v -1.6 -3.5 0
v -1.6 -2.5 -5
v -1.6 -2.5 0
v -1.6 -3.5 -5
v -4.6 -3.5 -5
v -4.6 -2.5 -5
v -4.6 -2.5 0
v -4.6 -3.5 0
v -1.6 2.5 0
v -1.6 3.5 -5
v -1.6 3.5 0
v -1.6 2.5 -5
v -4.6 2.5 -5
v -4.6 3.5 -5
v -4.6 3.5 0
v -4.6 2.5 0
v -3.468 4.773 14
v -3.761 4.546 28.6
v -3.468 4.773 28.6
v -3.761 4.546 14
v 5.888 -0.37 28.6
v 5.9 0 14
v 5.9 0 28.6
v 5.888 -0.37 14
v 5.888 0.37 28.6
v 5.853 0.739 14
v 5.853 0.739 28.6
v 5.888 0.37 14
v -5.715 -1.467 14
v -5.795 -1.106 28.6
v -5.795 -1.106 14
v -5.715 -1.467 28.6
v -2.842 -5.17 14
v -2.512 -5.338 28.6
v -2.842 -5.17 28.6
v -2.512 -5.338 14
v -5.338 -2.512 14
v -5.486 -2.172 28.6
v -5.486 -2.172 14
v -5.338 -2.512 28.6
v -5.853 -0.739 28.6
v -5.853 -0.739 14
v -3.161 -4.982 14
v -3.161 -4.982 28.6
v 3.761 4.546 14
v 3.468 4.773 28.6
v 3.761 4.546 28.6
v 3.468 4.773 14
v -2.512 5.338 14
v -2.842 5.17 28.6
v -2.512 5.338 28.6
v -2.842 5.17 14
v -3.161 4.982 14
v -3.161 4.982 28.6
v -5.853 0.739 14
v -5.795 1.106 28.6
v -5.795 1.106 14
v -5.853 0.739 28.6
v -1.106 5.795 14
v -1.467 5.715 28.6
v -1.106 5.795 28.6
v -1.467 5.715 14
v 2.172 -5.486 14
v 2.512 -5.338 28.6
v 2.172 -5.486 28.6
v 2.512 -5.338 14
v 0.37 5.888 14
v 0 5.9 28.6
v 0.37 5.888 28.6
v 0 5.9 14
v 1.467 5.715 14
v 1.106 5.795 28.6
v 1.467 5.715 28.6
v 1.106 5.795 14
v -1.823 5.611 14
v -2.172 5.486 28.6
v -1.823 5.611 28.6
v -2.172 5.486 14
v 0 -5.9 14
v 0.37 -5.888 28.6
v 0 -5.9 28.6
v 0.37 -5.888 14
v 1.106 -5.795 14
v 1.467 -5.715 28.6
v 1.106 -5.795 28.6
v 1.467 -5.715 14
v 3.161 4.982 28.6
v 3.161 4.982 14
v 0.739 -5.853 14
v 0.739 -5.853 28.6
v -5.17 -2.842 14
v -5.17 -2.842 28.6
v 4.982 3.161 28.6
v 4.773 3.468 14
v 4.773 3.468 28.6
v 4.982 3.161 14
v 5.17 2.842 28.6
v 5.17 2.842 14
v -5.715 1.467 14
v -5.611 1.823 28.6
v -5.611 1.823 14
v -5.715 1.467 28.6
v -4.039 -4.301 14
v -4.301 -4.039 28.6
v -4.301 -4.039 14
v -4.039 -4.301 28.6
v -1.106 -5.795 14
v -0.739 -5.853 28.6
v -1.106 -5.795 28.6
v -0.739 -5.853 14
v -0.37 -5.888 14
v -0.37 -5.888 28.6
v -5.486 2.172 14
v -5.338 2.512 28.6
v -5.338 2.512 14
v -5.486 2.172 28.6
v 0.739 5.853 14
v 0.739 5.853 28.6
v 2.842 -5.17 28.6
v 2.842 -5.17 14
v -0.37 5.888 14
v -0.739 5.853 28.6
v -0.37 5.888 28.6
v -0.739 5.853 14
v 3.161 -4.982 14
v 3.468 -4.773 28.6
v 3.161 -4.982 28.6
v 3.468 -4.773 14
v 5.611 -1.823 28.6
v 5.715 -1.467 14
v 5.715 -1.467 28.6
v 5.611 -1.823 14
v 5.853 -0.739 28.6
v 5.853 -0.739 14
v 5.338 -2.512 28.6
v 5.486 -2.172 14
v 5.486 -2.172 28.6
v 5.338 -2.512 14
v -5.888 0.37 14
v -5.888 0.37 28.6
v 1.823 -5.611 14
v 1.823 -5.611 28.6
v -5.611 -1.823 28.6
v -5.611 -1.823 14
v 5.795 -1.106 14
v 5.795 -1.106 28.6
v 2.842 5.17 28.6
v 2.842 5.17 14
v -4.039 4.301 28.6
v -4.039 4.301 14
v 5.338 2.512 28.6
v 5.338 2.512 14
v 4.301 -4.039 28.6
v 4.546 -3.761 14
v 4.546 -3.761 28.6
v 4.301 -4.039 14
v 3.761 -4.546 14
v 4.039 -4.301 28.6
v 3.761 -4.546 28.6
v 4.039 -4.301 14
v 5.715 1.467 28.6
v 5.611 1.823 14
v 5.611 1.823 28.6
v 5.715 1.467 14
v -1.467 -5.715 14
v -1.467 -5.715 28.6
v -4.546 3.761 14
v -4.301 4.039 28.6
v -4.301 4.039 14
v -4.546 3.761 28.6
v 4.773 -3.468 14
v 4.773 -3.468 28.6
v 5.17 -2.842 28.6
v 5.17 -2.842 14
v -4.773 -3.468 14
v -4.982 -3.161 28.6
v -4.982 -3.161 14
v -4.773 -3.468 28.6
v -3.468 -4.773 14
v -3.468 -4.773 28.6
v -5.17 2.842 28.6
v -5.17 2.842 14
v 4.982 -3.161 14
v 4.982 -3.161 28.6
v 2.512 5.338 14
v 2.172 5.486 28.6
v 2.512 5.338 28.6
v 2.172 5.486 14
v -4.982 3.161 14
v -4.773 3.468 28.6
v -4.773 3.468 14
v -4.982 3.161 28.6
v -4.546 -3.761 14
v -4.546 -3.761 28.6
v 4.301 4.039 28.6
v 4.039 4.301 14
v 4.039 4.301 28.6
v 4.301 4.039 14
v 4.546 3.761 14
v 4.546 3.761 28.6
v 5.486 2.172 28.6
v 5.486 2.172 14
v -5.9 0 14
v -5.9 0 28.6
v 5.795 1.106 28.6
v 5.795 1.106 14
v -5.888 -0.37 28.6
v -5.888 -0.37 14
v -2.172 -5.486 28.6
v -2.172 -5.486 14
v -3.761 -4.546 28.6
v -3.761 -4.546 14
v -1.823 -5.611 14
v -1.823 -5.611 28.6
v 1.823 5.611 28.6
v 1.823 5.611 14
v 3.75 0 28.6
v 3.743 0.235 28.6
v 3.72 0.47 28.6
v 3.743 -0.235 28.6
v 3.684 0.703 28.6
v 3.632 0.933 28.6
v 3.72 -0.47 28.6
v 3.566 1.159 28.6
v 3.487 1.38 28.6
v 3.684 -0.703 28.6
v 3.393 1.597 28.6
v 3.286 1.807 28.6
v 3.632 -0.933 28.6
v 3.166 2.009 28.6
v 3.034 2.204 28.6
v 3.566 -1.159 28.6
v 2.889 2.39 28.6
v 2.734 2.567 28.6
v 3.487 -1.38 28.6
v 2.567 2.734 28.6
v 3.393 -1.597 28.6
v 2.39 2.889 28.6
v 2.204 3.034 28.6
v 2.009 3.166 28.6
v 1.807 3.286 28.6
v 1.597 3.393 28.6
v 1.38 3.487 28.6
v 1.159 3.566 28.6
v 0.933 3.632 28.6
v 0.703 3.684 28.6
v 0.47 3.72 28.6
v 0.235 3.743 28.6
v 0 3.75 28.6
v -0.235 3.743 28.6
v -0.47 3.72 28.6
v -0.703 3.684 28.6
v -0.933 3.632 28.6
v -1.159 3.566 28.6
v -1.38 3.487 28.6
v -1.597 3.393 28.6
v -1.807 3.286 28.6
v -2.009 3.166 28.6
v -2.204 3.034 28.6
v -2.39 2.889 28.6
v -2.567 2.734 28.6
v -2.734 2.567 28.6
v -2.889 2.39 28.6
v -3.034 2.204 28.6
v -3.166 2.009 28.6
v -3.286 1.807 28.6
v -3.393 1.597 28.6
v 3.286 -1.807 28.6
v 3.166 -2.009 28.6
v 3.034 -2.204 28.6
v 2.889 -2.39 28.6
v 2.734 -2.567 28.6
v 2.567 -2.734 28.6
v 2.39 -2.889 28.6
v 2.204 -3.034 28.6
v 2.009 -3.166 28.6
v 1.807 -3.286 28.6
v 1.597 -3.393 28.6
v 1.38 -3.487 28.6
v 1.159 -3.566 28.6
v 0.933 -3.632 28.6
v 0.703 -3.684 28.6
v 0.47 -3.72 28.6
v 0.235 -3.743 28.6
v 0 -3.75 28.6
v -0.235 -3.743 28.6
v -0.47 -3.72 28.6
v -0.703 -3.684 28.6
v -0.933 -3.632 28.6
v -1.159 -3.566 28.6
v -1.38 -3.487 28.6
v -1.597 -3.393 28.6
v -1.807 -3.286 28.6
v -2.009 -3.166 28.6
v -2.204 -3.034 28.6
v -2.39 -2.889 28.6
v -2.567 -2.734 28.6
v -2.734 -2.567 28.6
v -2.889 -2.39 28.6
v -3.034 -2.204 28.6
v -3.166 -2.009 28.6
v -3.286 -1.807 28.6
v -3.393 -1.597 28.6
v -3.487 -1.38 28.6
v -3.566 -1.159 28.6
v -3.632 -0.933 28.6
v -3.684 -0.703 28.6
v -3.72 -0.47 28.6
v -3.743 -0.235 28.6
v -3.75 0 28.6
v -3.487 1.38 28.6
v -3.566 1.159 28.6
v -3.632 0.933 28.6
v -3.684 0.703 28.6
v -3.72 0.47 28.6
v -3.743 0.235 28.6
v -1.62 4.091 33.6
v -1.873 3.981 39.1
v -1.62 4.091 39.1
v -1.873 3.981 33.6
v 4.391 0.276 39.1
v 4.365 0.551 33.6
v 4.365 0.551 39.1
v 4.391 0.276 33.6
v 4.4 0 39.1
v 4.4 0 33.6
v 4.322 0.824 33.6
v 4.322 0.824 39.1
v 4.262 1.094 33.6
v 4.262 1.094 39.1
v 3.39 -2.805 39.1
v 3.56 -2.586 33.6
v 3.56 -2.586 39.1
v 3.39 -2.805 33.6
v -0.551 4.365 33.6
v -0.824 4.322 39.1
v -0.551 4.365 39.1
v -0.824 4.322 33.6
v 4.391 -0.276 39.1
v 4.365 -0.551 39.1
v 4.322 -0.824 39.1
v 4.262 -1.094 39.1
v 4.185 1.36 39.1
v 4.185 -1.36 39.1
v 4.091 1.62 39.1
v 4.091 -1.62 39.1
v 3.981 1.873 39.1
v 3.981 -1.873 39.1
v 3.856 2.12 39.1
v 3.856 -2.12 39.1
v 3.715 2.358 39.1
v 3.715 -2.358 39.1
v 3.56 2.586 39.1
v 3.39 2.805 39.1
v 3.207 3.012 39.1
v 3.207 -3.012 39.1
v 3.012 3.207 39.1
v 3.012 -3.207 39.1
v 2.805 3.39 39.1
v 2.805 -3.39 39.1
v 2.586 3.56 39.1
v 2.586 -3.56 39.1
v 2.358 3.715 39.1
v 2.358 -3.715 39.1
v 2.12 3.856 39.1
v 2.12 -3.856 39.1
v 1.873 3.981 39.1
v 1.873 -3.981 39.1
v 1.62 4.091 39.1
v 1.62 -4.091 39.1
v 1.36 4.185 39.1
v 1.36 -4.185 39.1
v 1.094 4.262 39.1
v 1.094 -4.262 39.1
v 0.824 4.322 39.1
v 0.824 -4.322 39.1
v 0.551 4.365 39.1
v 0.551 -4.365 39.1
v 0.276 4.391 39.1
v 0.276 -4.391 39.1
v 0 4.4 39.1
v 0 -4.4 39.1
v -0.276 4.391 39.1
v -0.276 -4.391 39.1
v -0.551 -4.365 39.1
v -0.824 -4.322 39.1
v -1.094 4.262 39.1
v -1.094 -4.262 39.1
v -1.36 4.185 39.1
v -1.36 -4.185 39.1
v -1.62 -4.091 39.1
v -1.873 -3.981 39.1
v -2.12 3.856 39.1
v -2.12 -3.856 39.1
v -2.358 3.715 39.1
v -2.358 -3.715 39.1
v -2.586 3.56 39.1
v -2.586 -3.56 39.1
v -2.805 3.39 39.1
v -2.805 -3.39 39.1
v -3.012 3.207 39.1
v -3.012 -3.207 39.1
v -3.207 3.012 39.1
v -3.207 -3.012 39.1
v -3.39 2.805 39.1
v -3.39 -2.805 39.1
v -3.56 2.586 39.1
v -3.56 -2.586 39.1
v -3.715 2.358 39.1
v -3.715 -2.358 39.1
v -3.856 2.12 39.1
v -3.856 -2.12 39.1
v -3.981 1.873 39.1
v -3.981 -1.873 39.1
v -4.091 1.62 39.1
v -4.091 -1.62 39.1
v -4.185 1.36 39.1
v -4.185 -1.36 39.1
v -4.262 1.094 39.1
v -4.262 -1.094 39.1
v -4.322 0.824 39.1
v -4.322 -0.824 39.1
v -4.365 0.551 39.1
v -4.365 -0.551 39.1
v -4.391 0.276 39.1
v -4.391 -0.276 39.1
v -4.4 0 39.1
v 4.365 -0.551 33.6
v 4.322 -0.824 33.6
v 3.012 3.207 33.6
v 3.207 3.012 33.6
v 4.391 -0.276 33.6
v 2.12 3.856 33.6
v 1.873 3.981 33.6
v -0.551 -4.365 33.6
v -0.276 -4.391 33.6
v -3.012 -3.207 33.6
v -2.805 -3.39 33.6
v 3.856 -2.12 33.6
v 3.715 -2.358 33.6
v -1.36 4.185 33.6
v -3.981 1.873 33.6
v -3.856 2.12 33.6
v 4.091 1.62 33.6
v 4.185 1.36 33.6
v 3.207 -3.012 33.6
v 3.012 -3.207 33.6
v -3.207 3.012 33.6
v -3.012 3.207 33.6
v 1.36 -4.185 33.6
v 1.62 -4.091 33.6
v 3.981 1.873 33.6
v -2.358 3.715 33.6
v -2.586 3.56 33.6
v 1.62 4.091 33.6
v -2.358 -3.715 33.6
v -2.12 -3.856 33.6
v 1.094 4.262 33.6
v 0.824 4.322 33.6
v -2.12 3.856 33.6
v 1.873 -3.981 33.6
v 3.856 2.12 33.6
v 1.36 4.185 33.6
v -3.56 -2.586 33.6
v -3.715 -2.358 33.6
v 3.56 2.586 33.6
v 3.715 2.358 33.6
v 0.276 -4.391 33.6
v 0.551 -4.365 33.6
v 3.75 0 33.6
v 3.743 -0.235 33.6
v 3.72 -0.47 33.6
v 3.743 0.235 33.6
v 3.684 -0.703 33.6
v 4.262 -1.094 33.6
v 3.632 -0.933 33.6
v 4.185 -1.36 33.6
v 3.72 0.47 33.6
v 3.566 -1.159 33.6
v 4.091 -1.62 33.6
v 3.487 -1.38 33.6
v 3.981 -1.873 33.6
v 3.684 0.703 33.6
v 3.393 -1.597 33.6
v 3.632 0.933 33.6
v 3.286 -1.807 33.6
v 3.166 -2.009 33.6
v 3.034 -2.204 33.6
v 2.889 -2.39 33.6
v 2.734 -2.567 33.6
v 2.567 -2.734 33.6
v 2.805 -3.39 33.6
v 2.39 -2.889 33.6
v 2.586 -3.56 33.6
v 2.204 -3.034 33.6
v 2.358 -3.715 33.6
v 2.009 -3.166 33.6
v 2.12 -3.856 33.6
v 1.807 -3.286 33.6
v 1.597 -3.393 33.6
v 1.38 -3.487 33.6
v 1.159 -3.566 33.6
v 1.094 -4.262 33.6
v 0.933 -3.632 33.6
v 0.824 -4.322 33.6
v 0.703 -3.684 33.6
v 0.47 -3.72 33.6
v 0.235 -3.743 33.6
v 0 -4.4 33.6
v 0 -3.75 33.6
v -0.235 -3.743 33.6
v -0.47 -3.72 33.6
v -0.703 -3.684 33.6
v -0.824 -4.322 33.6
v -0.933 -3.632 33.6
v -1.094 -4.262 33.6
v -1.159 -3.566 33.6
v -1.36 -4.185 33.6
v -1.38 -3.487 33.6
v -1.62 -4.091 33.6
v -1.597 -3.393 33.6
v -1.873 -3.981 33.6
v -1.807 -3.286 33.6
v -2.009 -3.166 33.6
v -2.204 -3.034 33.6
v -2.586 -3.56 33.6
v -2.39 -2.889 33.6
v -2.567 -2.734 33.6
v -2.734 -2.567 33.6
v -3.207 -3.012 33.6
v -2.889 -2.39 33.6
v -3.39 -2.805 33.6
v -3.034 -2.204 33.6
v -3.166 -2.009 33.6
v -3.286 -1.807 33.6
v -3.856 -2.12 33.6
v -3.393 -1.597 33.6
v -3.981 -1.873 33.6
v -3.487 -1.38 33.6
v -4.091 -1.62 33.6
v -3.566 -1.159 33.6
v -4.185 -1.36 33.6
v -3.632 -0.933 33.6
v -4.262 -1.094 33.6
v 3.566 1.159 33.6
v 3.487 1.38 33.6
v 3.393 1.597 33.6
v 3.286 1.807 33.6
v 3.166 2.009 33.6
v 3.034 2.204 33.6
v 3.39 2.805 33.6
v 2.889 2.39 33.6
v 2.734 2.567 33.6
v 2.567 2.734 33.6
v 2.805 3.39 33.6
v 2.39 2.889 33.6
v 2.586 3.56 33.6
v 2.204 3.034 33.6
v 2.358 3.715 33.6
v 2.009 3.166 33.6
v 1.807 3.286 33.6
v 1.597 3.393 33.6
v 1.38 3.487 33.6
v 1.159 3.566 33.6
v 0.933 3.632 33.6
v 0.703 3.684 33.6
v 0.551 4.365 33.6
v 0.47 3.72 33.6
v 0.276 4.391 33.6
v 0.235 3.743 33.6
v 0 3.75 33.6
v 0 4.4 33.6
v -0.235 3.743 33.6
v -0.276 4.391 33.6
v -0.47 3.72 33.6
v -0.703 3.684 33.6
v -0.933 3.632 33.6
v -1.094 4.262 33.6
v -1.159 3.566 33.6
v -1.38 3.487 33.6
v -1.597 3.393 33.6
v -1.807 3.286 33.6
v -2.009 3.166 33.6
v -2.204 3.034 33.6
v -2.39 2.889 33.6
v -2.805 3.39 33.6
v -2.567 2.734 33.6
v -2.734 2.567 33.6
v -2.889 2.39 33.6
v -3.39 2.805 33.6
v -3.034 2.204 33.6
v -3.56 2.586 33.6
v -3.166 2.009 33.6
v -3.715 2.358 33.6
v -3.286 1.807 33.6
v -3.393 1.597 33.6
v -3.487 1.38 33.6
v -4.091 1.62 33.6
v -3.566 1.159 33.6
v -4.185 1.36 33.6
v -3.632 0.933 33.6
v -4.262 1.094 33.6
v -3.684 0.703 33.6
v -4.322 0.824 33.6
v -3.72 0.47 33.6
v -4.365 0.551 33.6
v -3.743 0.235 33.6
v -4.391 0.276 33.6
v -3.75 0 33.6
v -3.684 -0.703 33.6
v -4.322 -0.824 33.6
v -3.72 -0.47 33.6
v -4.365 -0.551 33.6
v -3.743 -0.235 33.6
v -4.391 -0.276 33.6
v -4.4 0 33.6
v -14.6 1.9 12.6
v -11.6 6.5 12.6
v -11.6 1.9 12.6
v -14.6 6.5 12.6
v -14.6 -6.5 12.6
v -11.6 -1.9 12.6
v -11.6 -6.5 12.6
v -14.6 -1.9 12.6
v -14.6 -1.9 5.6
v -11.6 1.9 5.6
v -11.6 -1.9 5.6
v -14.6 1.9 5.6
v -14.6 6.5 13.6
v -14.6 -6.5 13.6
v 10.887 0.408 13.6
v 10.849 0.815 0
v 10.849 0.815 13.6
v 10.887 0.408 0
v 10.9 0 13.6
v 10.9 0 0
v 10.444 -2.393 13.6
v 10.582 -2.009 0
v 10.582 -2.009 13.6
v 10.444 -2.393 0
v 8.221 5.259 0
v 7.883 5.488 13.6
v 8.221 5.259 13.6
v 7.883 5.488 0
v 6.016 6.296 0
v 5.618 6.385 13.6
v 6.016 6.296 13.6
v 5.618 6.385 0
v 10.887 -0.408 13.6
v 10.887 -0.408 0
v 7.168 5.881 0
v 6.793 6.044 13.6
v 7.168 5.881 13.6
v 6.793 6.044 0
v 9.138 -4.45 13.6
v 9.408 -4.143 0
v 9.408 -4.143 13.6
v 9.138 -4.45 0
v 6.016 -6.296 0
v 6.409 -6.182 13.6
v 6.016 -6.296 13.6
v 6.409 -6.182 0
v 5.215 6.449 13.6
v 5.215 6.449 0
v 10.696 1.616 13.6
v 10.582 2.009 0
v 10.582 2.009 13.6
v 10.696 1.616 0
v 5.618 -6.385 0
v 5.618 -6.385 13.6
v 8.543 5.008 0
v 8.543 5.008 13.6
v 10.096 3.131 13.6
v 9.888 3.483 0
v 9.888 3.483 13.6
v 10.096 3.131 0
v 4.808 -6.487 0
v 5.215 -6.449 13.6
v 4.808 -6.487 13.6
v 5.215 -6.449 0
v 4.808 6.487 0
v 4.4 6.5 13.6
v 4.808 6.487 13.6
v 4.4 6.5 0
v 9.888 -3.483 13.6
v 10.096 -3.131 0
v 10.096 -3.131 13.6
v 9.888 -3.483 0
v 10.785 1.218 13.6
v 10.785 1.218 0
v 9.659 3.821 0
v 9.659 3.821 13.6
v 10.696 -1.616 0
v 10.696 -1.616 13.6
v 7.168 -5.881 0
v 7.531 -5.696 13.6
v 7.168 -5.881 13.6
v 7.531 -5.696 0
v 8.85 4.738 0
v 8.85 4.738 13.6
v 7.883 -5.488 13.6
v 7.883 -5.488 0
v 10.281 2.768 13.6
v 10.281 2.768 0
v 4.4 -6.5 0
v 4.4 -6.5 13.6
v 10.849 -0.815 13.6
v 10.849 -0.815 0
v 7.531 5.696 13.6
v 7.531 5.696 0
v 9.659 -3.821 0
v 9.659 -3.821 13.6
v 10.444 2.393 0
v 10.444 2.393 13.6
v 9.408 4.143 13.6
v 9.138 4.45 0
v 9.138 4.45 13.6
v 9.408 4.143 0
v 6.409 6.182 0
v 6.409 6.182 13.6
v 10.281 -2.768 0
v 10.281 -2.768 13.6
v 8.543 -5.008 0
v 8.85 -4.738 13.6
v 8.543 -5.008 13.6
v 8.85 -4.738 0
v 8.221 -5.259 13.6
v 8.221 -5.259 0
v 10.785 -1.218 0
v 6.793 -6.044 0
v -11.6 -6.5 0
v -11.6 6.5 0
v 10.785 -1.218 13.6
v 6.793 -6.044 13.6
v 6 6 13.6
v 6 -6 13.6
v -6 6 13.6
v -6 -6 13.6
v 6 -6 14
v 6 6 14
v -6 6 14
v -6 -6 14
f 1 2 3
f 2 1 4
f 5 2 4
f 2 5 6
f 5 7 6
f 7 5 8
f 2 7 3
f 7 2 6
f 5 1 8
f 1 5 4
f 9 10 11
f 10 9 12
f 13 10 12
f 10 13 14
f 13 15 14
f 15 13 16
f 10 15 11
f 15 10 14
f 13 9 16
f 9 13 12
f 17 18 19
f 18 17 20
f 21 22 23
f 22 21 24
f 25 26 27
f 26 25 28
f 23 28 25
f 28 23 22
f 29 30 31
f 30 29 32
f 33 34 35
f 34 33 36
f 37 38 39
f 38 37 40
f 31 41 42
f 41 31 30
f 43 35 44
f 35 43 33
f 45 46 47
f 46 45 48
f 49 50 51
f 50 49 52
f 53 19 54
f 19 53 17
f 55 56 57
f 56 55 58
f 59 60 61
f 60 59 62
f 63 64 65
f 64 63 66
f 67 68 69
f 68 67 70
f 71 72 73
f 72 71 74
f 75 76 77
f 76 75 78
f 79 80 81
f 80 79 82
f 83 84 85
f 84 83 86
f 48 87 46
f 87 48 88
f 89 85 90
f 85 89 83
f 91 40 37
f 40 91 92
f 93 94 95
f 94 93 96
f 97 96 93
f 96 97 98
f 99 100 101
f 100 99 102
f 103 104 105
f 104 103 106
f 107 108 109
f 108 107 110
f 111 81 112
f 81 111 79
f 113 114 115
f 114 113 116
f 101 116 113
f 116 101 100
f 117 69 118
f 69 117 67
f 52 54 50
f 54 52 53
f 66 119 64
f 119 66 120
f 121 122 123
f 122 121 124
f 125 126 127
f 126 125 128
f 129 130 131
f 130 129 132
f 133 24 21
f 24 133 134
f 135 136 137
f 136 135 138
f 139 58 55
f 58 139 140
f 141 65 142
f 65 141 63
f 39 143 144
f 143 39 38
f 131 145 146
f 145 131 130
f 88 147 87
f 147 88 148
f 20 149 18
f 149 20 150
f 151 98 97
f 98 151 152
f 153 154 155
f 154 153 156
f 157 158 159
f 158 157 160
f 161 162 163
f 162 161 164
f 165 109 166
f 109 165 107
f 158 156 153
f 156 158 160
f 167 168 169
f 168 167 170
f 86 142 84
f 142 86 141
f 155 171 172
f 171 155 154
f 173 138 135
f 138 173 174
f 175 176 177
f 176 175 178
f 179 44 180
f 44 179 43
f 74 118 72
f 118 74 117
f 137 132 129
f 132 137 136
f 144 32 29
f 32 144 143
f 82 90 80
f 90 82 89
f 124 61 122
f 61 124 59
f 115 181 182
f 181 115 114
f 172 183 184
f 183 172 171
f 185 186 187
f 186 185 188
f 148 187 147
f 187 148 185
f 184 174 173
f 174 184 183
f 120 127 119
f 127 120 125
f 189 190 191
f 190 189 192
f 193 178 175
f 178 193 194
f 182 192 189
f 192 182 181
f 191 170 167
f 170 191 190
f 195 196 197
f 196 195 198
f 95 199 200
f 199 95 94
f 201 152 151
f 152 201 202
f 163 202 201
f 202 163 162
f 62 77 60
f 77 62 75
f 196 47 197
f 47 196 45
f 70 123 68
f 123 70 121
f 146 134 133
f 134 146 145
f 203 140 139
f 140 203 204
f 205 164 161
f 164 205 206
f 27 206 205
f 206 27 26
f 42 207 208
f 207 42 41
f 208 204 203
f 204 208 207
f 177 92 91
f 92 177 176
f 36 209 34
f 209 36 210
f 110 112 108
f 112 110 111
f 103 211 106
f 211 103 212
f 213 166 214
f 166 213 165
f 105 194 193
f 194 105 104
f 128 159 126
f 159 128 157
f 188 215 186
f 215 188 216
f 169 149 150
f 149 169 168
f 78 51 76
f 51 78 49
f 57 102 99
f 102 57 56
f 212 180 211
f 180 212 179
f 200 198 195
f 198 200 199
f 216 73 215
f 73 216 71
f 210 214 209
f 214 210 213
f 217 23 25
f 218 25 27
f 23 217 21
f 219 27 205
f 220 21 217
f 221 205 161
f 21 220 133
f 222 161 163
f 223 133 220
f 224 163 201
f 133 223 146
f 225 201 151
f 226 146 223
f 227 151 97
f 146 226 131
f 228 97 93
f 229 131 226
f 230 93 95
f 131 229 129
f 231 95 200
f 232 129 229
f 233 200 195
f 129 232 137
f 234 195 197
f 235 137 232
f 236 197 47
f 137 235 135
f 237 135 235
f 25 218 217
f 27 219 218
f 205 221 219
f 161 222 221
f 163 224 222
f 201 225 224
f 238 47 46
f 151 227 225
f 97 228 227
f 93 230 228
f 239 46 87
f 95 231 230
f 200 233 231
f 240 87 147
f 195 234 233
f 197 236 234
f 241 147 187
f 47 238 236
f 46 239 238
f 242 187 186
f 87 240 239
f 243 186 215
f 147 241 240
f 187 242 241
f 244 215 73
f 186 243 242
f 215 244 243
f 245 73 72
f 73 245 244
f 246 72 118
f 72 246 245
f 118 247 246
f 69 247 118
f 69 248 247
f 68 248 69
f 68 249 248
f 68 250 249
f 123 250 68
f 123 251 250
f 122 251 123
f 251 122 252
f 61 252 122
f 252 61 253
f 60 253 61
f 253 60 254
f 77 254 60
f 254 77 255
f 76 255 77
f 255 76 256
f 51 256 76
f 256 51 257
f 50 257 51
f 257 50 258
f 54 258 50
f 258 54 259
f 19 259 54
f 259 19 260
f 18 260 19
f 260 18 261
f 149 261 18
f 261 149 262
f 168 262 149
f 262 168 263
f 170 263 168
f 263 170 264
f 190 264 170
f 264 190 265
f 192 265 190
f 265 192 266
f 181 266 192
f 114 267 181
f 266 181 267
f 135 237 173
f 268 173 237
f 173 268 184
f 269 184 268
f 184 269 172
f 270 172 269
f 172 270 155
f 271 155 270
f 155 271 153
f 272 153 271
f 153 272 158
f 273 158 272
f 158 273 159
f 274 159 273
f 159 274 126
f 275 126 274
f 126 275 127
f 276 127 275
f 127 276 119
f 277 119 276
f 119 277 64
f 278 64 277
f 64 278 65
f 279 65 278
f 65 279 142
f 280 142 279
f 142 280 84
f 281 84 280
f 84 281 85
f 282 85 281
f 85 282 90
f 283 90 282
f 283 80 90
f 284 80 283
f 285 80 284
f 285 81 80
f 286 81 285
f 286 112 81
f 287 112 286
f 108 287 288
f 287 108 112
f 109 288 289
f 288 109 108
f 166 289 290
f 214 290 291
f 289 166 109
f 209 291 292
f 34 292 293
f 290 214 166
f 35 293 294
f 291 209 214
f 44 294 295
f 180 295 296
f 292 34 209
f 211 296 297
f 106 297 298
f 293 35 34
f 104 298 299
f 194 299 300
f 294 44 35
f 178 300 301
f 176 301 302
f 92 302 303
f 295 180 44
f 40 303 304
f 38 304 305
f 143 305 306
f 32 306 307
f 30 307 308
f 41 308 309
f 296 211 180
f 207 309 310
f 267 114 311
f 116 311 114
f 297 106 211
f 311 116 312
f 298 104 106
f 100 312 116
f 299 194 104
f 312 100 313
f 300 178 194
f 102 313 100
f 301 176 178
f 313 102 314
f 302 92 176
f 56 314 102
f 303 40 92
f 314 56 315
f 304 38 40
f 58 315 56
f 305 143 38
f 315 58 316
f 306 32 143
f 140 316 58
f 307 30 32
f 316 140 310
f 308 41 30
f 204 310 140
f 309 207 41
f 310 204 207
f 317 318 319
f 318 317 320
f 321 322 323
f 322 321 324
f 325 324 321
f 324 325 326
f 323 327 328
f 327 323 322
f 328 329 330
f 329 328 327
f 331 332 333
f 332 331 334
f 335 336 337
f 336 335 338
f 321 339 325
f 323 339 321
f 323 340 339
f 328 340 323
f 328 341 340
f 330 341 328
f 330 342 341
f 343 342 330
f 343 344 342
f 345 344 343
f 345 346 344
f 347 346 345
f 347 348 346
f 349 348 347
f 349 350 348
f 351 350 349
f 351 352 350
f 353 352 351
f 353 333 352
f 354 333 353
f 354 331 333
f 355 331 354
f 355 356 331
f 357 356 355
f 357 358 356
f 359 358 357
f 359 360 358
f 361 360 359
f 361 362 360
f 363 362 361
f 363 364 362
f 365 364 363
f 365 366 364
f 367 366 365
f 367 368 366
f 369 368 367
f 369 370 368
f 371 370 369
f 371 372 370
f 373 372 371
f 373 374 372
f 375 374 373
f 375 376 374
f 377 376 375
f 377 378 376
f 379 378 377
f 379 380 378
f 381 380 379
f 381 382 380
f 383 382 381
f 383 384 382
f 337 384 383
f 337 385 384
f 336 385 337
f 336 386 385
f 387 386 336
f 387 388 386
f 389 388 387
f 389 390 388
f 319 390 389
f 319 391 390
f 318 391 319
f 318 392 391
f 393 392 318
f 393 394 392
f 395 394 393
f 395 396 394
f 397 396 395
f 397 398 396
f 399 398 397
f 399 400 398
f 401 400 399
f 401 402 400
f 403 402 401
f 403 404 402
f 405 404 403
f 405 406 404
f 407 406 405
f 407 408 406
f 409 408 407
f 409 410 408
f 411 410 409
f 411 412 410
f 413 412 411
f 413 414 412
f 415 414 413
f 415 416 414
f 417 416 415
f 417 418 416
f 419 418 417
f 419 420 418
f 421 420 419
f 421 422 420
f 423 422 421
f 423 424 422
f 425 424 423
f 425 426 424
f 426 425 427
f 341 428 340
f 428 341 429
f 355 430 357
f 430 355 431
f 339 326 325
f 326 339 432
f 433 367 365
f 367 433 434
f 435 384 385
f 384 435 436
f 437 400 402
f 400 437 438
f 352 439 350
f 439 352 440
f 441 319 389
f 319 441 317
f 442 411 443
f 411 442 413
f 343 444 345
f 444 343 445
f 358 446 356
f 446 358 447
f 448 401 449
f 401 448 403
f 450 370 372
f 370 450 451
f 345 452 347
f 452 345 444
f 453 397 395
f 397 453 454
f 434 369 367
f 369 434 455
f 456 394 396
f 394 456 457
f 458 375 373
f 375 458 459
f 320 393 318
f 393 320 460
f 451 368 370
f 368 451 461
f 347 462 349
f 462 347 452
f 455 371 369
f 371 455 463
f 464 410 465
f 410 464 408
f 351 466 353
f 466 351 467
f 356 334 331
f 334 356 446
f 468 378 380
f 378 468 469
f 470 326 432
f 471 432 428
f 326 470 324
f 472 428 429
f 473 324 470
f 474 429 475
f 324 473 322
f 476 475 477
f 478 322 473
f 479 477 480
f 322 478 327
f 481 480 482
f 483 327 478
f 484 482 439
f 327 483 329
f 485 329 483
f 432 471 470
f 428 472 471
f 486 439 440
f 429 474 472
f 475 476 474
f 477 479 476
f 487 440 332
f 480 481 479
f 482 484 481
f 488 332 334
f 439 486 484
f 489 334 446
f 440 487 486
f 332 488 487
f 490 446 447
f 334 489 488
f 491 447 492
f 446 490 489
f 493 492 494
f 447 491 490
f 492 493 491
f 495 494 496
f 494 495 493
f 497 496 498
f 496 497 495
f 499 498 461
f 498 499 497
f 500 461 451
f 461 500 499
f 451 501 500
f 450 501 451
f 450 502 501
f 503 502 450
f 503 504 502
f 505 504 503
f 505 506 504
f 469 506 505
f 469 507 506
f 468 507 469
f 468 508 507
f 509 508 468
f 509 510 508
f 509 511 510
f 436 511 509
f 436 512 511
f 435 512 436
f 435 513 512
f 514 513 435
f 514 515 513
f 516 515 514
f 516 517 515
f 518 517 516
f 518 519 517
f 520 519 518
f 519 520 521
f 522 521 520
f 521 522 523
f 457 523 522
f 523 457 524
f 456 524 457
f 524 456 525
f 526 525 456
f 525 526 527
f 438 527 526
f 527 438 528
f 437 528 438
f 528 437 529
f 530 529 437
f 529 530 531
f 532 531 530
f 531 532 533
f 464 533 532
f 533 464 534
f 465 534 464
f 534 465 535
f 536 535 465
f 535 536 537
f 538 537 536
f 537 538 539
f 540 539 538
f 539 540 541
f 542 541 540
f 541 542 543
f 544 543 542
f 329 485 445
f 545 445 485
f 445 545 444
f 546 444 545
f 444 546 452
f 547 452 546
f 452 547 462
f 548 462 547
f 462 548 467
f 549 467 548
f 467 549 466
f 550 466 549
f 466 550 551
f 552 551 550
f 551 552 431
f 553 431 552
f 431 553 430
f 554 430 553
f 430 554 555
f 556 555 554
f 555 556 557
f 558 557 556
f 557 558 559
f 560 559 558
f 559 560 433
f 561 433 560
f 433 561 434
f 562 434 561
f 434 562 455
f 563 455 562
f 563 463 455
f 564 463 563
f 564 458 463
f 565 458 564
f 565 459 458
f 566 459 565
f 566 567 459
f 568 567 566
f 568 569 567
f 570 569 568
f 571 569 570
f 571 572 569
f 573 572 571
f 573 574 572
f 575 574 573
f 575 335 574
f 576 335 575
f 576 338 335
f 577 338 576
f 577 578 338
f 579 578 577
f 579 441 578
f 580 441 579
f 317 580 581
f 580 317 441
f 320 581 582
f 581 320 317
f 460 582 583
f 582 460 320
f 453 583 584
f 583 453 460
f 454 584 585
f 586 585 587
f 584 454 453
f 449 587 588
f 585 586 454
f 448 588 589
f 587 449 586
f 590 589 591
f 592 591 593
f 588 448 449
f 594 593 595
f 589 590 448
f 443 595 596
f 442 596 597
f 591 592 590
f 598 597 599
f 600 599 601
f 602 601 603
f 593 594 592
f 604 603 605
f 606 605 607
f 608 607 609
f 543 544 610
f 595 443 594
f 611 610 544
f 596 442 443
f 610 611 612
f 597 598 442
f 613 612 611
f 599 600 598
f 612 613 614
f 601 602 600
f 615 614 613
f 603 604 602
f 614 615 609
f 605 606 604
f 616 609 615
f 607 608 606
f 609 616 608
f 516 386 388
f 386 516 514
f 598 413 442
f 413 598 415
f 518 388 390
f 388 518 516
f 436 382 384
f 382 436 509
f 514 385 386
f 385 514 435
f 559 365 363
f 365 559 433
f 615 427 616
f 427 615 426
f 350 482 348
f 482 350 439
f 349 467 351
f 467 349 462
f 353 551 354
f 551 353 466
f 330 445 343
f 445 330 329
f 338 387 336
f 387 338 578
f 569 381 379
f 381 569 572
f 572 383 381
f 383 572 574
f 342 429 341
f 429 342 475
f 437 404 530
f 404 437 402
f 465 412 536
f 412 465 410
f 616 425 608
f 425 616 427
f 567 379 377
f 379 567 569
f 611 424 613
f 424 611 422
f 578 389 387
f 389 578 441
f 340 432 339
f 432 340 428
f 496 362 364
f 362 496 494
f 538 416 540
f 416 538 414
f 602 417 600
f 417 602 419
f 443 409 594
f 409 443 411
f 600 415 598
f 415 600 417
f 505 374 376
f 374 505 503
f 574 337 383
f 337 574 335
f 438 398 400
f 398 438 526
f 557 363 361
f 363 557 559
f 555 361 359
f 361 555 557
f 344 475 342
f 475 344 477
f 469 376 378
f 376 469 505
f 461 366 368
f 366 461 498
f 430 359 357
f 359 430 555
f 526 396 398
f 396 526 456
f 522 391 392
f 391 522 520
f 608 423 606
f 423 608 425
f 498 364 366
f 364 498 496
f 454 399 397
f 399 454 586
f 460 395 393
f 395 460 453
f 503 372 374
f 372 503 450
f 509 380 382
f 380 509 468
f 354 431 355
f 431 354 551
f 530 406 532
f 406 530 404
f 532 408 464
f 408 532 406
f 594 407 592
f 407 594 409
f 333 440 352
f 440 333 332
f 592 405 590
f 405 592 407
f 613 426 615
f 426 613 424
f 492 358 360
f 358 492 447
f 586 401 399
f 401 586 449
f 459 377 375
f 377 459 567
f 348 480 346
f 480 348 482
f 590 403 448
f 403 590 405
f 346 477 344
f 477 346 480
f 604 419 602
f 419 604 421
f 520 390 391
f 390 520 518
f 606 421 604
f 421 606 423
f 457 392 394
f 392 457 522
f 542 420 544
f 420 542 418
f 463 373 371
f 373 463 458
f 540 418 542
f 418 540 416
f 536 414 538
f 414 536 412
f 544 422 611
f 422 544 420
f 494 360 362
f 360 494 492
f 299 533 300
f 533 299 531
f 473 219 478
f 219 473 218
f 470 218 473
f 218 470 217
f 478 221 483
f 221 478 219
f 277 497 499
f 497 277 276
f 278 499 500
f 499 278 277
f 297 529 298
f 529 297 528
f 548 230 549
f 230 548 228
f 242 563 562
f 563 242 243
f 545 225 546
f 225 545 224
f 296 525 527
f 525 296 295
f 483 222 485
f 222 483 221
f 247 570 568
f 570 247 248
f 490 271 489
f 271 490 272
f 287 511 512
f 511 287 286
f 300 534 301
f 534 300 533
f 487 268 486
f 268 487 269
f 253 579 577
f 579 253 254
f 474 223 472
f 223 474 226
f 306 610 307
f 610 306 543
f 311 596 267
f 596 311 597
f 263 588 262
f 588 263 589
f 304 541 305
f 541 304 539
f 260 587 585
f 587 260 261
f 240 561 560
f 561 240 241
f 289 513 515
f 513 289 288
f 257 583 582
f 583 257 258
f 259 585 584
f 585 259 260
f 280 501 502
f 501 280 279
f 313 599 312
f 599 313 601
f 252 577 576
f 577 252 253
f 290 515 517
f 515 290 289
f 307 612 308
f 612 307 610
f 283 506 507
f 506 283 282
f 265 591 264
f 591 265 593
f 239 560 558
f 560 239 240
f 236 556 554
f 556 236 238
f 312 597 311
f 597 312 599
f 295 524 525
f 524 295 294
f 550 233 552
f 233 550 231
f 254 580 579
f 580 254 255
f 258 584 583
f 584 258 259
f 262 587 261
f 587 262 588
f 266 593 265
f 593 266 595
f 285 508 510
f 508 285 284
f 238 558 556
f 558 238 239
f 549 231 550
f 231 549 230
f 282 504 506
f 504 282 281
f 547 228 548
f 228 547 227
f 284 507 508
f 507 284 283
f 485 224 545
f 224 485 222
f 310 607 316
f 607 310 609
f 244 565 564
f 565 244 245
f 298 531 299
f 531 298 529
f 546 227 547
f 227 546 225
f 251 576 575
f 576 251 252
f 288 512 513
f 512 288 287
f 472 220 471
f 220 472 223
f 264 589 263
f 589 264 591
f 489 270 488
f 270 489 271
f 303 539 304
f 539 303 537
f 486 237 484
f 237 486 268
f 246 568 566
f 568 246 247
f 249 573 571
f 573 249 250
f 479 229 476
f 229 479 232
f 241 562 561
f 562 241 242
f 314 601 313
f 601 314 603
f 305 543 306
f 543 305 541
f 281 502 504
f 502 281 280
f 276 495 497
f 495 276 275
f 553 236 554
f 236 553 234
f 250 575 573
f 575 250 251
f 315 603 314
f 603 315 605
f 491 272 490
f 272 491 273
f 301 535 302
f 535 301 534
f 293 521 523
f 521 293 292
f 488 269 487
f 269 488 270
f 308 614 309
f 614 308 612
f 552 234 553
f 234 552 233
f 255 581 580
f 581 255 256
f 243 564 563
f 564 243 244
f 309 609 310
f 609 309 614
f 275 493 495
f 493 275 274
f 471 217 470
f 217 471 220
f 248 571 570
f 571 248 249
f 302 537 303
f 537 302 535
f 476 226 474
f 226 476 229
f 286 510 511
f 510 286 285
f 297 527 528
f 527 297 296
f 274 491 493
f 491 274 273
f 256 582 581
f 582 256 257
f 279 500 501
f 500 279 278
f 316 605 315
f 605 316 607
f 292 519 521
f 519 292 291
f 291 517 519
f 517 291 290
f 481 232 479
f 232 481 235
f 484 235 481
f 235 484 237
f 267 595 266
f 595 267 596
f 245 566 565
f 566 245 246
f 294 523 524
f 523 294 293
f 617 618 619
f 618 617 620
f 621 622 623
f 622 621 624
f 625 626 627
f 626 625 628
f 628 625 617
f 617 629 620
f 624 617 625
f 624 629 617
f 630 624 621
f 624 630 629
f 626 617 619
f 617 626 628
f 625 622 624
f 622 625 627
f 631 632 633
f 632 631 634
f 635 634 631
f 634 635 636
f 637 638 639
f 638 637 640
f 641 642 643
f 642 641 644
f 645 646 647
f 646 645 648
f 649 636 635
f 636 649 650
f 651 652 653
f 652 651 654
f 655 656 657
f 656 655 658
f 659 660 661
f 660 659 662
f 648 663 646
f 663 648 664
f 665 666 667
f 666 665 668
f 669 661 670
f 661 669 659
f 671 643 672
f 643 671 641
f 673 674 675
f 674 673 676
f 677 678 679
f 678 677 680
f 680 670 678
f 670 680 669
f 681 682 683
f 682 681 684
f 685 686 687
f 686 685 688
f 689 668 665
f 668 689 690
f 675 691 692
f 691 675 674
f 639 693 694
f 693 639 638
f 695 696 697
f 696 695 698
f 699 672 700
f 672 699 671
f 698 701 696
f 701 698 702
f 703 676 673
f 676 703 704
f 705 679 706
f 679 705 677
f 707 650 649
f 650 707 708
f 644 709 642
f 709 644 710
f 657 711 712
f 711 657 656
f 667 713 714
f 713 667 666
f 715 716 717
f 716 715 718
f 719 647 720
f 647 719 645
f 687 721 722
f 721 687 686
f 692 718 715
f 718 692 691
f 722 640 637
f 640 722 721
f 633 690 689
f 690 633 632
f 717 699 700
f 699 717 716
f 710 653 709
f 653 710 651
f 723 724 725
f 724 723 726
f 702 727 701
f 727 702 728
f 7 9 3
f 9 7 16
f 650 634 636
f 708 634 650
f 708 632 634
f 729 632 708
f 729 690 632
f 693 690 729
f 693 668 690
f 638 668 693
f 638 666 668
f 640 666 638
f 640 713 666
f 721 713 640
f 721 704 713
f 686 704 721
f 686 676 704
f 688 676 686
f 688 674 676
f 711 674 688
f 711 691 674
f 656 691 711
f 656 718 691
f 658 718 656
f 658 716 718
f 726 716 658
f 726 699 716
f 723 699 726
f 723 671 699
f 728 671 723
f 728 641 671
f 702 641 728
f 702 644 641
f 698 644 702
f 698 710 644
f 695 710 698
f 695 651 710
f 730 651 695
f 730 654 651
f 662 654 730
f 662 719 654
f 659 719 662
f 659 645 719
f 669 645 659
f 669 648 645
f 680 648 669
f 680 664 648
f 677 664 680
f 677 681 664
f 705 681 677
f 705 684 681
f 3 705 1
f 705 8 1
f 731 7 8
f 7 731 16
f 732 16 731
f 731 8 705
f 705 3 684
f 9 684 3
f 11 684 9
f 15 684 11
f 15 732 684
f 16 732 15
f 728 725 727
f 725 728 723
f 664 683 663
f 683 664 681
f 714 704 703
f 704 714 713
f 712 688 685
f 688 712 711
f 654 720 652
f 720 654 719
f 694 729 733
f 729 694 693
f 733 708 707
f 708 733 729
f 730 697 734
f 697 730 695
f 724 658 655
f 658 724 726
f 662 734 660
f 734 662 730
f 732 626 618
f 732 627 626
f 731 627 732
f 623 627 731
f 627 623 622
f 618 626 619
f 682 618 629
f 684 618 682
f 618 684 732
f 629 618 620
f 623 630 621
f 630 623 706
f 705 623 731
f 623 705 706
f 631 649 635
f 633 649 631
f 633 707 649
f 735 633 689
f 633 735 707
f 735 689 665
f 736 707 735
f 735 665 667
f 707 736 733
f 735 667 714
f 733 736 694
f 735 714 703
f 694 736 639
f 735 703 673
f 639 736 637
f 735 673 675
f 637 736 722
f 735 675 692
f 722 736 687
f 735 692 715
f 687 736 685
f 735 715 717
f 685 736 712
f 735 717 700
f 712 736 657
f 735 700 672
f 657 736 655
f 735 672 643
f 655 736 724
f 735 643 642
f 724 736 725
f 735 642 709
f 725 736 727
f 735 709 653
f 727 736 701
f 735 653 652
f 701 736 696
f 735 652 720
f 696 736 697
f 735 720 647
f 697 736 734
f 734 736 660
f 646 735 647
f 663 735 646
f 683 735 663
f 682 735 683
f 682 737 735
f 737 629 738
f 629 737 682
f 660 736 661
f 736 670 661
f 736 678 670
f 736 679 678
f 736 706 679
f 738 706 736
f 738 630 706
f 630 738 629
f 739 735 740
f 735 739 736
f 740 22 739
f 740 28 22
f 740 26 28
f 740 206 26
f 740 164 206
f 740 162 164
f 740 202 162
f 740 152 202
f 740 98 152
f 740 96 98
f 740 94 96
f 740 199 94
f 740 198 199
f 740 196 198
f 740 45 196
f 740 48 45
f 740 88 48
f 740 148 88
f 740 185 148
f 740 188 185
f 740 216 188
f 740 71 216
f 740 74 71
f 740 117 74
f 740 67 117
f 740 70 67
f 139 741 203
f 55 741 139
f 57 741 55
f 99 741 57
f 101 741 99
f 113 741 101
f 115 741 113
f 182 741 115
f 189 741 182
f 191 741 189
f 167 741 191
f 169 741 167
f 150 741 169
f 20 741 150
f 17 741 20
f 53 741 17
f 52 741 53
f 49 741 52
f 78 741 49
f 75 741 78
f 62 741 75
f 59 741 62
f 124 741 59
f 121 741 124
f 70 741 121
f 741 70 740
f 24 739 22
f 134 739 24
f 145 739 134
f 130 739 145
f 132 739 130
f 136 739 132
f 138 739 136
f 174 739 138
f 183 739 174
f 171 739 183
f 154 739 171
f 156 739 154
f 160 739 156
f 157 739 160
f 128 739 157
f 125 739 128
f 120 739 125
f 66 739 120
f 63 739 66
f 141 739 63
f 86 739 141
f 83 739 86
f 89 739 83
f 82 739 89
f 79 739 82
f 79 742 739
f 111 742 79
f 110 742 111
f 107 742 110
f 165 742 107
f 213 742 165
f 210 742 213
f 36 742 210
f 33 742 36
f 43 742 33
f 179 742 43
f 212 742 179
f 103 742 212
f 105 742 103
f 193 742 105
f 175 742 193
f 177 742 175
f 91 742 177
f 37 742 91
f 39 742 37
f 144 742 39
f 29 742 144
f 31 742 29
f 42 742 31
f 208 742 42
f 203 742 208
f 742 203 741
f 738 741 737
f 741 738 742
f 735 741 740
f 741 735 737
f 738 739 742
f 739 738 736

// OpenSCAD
$fn=100;
epsilon=0.01;

// Datasheet at https://www.taydaelectronics.com/datasheets/files/A-4807.pdf
//
// But it doesn't actually match what I've measured with the calipers, so
// this has some different measurements.

// The threaded area: a M12x0.75 nut will thread over it, and
// the "11.8mm" diameter is an approximate outer thread size
module threaded()
{
	translate([0,0,13.6])
		cylinder(d=11.8, h=15);
}

// Top of the switch itself
module topcap()
{
	translate([0,0,13.6 + 14.9 + 5.1])
		cylinder(d=8.8, h=5.5);
}

// The "neck" of the cylinder between the threaded and top
// Only 5.1mm mm is exposed, the rest is hidden inside the threaded
// area and the top cap
module neck()
{
	translate([0, 0, 13.6 + 15 + 2.5])
		cylinder(d=7.5, h=10, center=true);
}

module pins()
{
	translate([-3.1, -3, 0]) cube([3, 1, 10], true);
	translate([-3.1, +3, 0]) cube([3, 1, 10], true);
}

module stomp_switch()
{
	color("silver") {
		threaded();
		topcap();
		neck();
		pins();
	}


	width=13;
	height=13.6;
	endpos = 11.5+3.1;
	bodyend = endpos-3;
	midcylinder = 25.5-3.1-11.5-width/2;

	// Slight protrusion
	color("silver")
	translate([0,0,height])
		cube([12,12,0.8],true);

	// Another odd protrusion
	color("#404040") {
		translate([-11.5-3.1, -1.9, 5.6])
			cube([10, 3.8, 7]);

		// Cylinder
		translate([midcylinder, 0])
			cylinder(d=width, h=height-1);

		translate([-bodyend, -width/2])
			cube([bodyend+midcylinder, width, height-1]);
	}

	// "top plate"
	color("burlywood") {
		translate([-endpos,-width/2, height-1])
			cube([endpos+midcylinder, width, 1]);
		translate([midcylinder,0, height-1])
			cylinder(d=width, h=1);
	}
}

stomp_switch();
